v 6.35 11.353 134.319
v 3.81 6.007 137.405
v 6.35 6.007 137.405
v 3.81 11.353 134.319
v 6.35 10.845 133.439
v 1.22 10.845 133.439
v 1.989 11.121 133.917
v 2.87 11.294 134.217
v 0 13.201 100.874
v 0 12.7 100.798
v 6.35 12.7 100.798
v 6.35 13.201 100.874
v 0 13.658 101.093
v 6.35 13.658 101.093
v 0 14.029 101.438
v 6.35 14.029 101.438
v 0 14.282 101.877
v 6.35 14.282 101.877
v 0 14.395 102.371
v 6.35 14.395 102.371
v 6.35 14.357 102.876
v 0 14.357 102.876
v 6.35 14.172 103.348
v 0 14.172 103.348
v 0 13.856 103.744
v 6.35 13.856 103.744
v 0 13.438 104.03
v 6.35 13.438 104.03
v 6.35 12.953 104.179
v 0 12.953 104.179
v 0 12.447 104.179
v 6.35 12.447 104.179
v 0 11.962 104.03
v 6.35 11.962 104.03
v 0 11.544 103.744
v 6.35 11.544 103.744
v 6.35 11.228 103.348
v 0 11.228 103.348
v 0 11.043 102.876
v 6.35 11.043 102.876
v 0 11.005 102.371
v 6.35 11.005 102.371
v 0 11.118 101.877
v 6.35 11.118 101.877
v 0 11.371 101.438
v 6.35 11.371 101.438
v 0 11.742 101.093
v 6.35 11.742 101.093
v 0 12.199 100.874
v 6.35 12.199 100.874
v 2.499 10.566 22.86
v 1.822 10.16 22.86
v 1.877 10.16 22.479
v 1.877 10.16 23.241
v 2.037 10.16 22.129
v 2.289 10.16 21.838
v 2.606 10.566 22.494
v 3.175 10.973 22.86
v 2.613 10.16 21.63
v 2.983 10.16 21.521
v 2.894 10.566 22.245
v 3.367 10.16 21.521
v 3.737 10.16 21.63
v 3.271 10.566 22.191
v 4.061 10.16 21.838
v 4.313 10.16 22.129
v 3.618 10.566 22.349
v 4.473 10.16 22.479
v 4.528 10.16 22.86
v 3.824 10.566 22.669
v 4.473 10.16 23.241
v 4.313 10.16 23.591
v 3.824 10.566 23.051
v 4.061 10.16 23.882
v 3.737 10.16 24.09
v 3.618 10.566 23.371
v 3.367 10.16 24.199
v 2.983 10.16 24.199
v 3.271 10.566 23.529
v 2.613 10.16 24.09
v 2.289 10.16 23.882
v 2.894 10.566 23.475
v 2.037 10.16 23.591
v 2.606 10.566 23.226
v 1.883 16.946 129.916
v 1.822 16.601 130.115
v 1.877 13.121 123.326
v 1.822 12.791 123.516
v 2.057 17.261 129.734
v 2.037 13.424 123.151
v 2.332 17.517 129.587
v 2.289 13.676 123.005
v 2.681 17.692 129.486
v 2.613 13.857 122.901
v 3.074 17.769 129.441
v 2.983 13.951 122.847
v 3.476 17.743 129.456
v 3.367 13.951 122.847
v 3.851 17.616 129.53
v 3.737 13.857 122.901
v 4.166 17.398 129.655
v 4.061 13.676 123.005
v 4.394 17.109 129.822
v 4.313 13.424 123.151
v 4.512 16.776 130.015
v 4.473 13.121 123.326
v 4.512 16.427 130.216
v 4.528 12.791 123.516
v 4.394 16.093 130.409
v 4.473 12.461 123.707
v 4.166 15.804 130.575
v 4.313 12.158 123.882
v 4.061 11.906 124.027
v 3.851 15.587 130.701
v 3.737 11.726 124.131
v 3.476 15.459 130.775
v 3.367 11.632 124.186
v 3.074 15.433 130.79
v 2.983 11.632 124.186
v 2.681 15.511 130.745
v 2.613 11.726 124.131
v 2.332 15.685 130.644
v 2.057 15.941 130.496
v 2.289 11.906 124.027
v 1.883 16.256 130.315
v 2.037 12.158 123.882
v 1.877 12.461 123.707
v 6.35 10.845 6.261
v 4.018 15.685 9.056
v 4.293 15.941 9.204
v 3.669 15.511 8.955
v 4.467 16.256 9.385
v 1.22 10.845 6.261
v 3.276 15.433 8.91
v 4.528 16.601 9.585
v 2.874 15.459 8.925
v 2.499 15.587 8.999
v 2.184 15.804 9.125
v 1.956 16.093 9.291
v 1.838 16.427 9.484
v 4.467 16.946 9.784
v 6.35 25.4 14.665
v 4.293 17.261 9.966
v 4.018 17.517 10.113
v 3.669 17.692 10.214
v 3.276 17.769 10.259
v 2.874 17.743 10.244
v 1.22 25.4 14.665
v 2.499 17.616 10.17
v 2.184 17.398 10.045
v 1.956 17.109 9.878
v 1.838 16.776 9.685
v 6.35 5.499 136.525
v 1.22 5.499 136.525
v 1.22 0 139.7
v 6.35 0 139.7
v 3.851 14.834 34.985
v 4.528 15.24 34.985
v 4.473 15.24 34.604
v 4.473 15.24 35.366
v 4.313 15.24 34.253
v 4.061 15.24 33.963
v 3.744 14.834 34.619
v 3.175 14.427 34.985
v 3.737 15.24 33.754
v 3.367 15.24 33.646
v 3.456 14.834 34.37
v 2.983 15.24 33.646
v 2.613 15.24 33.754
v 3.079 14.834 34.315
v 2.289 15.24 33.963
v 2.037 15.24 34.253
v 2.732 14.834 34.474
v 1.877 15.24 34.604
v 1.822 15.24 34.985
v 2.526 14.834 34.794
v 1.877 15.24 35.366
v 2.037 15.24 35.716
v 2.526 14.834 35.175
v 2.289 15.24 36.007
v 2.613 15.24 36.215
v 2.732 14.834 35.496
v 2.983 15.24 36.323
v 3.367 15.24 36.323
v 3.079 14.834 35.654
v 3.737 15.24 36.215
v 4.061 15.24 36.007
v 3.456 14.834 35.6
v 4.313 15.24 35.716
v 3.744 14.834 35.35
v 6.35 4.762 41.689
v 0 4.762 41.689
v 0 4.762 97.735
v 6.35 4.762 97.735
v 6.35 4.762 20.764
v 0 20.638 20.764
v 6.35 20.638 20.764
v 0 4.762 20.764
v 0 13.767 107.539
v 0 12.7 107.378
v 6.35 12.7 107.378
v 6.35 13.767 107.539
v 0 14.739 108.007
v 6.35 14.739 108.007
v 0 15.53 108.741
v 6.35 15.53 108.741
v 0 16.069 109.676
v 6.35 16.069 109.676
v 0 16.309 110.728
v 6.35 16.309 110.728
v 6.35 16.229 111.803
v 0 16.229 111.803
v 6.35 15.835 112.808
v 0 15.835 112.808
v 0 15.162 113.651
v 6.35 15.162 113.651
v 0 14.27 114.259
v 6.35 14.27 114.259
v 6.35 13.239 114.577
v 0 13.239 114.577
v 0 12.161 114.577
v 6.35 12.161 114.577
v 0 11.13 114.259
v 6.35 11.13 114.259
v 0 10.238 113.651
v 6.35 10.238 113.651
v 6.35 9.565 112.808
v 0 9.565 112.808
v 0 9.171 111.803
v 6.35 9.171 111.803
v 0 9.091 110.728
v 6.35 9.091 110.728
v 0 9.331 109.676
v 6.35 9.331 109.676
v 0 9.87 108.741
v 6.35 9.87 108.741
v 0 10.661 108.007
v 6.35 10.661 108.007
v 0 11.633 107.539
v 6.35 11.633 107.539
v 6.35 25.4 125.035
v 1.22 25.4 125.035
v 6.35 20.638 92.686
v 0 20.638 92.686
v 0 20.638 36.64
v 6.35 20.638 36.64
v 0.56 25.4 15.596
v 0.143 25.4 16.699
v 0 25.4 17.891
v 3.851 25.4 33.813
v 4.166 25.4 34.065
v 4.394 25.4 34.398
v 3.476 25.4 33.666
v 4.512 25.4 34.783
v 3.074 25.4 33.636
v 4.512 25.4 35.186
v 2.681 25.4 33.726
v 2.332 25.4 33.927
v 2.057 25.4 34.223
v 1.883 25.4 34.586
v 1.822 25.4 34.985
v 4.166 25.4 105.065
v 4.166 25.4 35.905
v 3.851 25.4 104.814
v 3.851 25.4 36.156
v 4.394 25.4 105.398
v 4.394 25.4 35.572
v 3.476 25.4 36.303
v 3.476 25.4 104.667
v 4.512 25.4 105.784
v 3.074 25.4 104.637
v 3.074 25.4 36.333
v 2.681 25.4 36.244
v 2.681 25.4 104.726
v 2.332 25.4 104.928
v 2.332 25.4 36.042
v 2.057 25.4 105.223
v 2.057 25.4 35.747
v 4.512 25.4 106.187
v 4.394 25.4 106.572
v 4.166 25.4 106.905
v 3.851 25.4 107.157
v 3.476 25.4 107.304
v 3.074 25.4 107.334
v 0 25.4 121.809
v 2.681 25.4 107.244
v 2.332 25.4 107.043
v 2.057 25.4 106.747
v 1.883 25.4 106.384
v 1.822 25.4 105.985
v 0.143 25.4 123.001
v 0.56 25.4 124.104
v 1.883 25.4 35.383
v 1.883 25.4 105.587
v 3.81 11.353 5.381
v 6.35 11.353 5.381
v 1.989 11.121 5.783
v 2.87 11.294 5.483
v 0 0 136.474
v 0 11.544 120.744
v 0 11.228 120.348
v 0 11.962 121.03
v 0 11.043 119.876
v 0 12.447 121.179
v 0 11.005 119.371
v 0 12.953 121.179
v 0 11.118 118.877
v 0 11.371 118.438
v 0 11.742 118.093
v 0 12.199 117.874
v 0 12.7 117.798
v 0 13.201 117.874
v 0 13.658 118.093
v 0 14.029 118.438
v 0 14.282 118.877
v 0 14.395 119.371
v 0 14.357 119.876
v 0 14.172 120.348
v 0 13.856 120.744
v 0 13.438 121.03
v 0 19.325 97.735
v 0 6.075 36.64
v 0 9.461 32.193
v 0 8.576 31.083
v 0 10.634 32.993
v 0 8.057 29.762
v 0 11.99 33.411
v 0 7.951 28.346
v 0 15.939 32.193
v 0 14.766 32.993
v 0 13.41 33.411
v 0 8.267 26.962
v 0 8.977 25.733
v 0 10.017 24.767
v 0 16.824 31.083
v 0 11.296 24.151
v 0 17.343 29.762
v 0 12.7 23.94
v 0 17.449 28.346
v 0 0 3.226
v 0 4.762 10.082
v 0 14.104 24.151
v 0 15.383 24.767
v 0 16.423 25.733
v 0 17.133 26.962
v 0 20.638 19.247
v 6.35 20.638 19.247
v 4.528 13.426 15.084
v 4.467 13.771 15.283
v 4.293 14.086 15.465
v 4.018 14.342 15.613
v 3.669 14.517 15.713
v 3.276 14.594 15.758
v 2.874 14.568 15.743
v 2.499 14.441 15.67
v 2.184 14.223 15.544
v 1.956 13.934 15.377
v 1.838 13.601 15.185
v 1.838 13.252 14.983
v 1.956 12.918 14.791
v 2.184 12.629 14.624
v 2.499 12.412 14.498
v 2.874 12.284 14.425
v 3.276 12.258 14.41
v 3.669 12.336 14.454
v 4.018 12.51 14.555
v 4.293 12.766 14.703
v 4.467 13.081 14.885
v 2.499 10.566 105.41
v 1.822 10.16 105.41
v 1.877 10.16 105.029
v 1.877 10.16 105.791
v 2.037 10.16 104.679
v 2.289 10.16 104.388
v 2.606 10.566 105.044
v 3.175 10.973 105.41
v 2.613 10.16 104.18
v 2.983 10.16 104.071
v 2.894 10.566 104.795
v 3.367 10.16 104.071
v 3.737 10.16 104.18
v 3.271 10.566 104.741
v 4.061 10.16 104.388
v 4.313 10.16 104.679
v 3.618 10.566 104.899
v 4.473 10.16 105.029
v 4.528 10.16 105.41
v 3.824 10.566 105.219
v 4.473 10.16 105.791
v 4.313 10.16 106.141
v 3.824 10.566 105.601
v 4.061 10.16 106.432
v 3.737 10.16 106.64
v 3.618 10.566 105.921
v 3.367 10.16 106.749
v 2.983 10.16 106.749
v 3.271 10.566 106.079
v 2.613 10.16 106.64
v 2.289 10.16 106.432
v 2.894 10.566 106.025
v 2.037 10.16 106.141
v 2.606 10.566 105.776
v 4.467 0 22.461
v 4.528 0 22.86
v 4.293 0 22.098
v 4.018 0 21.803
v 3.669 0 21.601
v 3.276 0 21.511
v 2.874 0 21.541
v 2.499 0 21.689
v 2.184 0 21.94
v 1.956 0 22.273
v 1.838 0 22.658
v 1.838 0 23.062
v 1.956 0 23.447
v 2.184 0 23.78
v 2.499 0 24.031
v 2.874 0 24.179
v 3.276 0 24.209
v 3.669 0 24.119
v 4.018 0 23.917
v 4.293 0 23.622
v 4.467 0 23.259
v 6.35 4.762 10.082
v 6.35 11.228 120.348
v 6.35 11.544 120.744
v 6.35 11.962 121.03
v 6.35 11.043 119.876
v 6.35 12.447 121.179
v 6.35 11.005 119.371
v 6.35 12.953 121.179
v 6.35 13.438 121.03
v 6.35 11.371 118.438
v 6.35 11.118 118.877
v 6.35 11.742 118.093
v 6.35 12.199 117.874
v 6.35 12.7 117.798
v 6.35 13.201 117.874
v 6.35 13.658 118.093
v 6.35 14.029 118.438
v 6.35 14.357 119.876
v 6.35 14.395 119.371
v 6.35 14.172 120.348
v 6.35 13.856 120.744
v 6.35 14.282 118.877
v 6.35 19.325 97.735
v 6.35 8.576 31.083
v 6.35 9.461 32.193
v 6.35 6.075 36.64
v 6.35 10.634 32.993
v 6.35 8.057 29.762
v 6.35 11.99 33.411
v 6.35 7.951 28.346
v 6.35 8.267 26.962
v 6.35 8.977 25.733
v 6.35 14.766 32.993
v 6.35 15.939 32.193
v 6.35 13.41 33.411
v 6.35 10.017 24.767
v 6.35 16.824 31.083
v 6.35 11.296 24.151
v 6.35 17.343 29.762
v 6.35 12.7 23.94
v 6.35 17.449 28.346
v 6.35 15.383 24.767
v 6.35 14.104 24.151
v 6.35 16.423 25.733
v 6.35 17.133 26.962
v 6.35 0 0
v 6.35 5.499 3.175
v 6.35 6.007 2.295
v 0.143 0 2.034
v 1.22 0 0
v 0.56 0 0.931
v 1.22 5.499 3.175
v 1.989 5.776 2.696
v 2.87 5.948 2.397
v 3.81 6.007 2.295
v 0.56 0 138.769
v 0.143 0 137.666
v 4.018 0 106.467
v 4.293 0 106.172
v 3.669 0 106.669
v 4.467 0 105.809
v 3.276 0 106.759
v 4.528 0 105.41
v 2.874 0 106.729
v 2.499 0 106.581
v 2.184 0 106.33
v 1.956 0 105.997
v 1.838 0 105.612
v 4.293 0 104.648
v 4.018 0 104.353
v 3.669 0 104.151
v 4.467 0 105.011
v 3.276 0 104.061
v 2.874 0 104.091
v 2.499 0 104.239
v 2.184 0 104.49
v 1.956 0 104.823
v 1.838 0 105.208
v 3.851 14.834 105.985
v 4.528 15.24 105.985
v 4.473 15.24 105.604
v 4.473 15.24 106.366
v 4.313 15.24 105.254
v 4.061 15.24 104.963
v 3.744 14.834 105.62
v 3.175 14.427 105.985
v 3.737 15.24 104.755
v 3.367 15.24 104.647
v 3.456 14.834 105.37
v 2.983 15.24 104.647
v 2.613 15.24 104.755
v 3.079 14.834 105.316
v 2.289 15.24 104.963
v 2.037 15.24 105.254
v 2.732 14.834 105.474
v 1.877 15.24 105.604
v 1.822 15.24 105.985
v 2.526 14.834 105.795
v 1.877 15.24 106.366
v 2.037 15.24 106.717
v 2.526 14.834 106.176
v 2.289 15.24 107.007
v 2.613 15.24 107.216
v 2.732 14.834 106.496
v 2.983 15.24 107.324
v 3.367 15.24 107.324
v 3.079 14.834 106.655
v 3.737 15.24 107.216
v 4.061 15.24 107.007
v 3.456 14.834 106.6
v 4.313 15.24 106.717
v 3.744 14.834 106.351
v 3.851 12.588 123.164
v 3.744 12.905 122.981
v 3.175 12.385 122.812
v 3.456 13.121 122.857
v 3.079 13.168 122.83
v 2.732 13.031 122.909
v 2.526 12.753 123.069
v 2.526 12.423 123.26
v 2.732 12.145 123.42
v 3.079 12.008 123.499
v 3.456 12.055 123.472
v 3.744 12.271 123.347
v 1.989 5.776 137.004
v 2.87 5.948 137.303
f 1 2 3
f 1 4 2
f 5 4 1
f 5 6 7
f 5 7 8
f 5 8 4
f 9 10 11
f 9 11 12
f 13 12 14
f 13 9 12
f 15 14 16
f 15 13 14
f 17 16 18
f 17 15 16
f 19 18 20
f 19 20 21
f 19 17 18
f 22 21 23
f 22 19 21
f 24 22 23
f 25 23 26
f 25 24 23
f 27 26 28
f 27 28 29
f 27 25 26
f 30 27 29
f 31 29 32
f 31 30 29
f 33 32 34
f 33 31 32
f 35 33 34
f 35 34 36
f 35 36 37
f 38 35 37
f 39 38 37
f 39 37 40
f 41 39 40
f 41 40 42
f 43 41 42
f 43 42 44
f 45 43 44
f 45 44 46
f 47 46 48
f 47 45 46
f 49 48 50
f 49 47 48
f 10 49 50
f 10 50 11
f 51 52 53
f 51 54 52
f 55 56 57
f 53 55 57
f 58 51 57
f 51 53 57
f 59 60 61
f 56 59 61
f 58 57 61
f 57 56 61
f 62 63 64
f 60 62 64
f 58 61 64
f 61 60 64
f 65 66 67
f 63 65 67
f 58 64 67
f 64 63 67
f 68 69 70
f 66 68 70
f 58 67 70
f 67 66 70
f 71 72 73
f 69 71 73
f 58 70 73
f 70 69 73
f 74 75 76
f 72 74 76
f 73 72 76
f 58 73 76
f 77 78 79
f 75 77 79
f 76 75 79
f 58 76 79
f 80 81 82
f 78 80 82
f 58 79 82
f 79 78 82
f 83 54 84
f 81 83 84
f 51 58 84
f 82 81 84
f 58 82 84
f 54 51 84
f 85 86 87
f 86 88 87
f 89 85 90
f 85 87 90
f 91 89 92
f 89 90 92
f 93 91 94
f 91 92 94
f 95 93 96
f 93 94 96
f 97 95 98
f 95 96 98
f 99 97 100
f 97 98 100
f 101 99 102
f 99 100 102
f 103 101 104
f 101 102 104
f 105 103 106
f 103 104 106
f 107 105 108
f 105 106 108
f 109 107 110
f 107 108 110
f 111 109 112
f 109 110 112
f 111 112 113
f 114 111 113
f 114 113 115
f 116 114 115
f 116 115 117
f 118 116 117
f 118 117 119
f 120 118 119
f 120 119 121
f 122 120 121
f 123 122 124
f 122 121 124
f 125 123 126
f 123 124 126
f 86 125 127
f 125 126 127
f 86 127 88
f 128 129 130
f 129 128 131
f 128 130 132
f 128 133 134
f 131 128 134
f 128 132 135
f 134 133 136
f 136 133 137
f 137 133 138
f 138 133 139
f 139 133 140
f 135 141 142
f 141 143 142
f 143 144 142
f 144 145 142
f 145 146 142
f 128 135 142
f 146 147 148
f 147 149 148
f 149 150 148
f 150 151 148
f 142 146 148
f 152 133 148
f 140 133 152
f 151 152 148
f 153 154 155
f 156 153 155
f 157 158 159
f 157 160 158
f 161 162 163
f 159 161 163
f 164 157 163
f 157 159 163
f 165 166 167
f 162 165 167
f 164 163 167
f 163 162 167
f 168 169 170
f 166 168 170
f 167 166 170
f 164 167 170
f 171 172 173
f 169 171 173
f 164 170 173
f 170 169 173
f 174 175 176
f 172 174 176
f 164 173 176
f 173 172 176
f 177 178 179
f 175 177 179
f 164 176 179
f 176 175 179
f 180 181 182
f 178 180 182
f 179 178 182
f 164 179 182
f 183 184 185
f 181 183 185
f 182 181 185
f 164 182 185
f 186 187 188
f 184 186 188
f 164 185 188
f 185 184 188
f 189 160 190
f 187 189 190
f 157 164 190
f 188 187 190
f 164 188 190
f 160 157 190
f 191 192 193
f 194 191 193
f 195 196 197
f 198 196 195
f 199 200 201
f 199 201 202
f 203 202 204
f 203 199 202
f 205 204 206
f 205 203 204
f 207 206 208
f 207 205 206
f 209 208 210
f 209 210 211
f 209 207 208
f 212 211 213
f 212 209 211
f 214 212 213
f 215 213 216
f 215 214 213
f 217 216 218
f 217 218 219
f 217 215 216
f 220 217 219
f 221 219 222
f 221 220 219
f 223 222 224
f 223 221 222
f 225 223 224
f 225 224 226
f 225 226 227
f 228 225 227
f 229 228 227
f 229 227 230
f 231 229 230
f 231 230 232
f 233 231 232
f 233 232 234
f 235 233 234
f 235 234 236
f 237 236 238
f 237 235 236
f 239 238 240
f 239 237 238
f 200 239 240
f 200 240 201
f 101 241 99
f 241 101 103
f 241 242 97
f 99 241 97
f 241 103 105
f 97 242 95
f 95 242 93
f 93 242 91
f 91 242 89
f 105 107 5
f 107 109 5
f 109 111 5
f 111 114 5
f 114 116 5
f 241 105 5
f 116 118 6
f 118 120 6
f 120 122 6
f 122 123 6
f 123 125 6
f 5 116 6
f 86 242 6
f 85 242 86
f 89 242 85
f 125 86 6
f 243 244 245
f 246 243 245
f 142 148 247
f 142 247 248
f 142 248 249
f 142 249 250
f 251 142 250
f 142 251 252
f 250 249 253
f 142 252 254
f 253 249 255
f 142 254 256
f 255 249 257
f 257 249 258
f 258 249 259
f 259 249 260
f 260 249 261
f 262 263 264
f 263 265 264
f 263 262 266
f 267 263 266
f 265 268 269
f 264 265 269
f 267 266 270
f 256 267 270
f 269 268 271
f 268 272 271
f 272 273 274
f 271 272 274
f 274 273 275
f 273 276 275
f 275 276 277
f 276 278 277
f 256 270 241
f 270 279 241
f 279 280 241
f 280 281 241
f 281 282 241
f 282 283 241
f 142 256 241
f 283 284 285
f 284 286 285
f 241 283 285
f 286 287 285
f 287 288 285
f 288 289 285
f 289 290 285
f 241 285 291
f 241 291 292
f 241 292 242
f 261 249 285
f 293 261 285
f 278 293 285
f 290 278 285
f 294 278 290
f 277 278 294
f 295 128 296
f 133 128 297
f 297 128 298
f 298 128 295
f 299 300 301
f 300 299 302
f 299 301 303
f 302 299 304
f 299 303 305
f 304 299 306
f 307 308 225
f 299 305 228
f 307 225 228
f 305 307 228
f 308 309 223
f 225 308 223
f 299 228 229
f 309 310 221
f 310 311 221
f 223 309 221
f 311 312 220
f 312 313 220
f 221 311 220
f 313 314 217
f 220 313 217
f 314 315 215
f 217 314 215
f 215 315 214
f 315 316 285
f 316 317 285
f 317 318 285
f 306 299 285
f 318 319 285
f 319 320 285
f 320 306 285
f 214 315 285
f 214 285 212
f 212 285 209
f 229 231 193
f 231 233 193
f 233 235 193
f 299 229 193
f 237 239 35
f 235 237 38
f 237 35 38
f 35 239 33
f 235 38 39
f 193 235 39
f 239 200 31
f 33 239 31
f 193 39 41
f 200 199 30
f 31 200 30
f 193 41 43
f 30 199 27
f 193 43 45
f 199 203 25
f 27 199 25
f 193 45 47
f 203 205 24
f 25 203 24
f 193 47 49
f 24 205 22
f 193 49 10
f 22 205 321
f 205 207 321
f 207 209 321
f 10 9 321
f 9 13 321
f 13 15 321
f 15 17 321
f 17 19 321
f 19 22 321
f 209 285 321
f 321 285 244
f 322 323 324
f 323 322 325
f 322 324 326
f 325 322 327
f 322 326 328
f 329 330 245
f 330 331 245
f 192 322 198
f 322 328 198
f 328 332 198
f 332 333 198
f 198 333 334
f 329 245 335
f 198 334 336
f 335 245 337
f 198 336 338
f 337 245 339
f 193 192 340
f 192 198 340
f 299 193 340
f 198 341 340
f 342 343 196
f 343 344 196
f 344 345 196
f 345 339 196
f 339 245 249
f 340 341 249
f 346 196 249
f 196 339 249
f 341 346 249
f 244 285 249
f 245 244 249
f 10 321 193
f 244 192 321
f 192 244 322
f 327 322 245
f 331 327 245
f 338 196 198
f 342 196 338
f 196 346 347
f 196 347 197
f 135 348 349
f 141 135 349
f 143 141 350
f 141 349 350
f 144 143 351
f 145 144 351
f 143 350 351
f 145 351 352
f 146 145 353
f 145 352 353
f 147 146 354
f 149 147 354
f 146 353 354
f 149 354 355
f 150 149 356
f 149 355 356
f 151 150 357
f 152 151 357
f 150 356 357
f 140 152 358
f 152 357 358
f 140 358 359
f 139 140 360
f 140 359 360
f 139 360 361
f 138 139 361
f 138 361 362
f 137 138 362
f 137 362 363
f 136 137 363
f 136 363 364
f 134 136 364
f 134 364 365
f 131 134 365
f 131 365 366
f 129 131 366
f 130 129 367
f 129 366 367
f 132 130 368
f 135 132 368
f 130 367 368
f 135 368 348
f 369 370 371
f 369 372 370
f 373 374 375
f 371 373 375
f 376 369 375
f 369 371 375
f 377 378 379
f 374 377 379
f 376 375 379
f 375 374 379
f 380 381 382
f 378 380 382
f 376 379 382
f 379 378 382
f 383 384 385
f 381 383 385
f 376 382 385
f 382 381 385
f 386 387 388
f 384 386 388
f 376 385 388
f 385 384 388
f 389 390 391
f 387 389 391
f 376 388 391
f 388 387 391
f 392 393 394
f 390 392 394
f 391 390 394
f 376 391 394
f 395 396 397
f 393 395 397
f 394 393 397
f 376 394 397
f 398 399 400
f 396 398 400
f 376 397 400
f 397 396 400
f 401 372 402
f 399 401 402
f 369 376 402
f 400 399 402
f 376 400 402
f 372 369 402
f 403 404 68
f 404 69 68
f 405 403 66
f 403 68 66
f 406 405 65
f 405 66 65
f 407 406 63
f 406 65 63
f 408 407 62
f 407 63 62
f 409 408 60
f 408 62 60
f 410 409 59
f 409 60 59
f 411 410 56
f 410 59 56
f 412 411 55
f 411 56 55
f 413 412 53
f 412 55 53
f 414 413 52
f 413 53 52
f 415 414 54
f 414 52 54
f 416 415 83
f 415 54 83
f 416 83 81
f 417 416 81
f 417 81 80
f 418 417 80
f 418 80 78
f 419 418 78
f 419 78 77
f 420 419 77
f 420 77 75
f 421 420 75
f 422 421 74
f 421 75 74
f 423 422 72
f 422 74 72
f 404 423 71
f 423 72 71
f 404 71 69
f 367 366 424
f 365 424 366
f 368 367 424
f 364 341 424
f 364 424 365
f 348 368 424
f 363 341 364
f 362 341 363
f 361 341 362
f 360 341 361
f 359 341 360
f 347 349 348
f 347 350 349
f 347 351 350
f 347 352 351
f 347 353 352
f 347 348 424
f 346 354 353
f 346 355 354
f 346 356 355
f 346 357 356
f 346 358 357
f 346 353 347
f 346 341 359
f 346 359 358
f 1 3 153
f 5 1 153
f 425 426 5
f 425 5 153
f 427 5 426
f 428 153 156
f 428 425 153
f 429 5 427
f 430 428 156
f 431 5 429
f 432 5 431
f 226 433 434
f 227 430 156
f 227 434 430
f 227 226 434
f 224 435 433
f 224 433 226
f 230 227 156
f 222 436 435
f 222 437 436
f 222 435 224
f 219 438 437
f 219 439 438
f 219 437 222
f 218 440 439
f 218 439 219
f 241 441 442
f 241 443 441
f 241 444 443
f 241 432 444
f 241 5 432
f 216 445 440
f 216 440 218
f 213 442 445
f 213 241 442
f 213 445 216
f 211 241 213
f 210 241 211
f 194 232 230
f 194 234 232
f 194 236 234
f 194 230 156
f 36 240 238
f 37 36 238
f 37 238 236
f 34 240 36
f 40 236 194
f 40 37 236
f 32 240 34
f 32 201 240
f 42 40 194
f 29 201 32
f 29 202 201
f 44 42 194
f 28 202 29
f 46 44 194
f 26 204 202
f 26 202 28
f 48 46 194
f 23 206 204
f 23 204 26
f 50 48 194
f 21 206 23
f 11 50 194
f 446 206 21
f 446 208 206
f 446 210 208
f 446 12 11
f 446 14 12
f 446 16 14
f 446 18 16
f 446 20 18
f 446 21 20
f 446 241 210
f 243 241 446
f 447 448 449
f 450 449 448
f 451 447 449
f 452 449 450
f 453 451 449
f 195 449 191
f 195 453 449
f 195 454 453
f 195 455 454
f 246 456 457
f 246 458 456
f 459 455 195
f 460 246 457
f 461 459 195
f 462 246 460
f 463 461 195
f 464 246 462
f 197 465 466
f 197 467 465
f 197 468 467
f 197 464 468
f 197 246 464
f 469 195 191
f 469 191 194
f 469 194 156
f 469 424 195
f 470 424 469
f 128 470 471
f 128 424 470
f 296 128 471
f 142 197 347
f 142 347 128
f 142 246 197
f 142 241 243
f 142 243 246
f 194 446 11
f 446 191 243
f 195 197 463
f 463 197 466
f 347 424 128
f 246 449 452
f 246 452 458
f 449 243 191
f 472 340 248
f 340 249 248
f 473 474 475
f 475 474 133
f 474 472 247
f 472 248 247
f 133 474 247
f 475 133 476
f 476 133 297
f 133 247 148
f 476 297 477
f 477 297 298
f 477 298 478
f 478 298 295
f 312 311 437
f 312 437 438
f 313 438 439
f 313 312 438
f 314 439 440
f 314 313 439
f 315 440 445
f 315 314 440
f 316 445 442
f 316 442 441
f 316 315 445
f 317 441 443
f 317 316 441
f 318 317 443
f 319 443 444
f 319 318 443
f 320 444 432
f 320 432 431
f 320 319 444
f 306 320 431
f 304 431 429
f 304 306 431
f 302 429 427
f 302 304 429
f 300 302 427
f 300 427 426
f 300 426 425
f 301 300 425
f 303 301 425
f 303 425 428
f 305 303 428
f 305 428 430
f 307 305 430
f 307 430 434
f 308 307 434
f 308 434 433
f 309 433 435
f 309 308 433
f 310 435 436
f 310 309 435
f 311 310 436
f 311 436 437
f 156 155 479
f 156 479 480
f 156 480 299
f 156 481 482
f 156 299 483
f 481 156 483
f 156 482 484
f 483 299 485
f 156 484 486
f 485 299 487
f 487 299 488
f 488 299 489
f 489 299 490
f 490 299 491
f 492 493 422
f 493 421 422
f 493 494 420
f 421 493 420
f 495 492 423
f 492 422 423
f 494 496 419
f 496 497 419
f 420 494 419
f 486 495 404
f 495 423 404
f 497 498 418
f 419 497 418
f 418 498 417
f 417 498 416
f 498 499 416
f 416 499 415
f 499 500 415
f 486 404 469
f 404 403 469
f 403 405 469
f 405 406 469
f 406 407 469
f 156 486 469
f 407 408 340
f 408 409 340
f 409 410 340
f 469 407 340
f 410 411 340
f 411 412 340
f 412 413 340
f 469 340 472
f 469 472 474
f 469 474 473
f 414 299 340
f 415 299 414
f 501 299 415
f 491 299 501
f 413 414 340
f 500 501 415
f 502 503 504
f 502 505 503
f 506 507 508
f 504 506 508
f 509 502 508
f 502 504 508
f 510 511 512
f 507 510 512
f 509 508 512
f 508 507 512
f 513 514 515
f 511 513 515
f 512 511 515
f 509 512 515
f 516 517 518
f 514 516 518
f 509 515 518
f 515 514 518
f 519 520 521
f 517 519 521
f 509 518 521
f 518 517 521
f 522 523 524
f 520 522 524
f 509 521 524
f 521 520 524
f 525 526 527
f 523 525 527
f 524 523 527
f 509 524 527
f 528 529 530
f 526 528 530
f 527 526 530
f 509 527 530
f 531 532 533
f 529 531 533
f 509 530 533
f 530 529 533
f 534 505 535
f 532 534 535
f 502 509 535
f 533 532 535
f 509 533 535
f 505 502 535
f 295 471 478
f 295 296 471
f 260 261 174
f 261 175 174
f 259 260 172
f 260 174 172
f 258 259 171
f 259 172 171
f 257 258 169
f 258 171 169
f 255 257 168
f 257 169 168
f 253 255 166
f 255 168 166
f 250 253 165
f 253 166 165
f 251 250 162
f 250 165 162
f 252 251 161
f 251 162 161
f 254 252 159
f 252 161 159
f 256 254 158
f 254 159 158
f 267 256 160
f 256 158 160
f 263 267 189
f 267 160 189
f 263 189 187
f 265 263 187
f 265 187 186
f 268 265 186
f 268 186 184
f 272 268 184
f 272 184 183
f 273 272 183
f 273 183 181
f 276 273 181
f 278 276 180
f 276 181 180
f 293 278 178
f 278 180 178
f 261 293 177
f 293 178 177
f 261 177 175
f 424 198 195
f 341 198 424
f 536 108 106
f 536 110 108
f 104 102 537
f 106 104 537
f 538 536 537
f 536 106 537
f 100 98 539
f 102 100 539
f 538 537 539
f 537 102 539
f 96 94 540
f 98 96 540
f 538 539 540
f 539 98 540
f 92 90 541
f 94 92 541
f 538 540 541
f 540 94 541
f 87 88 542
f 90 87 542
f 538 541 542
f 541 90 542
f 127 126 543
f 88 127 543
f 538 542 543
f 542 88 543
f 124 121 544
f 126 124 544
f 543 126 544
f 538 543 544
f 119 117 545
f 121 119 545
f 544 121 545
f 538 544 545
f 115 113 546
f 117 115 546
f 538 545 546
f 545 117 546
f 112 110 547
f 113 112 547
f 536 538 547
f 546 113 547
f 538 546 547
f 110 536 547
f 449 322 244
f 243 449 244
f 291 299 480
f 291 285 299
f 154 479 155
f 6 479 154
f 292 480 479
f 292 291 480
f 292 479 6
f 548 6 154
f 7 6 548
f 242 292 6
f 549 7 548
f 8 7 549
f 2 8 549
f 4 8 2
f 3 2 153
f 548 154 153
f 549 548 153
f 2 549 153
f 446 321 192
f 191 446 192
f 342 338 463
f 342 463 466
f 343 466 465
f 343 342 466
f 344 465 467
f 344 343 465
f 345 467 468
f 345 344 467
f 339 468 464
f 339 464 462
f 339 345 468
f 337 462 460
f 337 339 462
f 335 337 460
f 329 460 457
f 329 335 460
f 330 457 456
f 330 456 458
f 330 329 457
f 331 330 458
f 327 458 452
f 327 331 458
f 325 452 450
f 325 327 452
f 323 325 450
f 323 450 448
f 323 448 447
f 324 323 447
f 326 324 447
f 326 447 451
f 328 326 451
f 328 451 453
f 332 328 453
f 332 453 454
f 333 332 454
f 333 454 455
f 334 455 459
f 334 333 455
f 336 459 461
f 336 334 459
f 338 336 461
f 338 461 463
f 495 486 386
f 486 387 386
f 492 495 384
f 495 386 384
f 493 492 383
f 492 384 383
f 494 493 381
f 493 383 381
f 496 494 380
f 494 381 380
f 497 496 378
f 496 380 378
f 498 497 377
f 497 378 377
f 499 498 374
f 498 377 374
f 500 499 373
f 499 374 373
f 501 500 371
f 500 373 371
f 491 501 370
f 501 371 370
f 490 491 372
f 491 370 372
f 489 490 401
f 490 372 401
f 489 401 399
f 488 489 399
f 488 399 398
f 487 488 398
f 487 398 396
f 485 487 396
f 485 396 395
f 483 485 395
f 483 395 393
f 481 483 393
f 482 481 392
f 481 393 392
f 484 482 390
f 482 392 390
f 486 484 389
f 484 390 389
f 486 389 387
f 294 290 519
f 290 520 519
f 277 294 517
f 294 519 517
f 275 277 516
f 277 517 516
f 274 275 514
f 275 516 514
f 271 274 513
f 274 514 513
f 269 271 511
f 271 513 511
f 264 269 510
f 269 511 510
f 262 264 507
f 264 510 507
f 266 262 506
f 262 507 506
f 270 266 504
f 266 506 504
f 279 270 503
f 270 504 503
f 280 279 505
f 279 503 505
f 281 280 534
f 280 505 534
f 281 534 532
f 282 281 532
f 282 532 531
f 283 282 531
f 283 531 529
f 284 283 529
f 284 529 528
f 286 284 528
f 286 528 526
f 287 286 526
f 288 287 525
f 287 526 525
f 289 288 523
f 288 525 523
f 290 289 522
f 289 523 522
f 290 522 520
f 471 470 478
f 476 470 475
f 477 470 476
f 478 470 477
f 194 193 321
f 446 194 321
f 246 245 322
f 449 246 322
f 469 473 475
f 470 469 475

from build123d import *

# Parameters (mm, degrees)
SKETCH1_R                     = 3.6195
SKETCH1_R_2                   = 4.7625
SKETCH1_R_3                   = 1.6999966
BOSS_EXTRUDE1_DEPTH           = 6.35
TAP_DRILL_FOR_6_32_TAP4_D     = 2.7051
TAP_DRILL_FOR_6_32_TAP4_DEPTH = 10.16
TAP_DRILL_FOR_6_32_TAP4_TIP   = 0.81269403
TAP_DRILL_FOR_6_32_TAP3_D     = 2.7051
TAP_DRILL_FOR_6_32_TAP3_DEPTH = 10.16
TAP_DRILL_FOR_6_32_TAP3_TIP   = 0.81269403
SKETCH11_W                    = 6.35
SKETCH11_H                    = 6.1722
BOSS_EXTRUDE2_DEPTH           = 1.016
SKETCH12_W                    = 6.35
SKETCH12_H                    = 6.1722
BOSS_EXTRUDE3_DEPTH           = 1.016
TAP_DRILL_FOR_6_32_TAP1_D     = 2.7051
TAP_DRILL_FOR_6_32_TAP1_DEPTH = 7.62
TAP_DRILL_FOR_6_32_TAP1_TIP   = 0.81269403
TAP_DRILL_FOR_6_32_TAP2_D     = 2.7051
TAP_DRILL_FOR_6_32_TAP2_DEPTH = 7.62
TAP_DRILL_FOR_6_32_TAP2_TIP   = 0.81269403
CUT_EXTRUDE1_DEPTH            = 143.132235964
FILLET1_R                     = 3.81


with BuildPart() as part:
    # Sketch1 → Boss-Extrude1 (new body)
    with BuildSketch(Plane(origin=(0, 0, 0), x_dir=(0, 0, -1), z_dir=(1, 0, 0))):
        Polygon((0, 0), (-14.664696837, 25.4), (-125.035303163, 25.4), (-139.7, 0), align=None)
        with Locations((-110.998, 12.7)):
            Circle(SKETCH1_R, mode=Mode.SUBTRACT)
        with Locations((-28.702, 12.7)):
            Circle(SKETCH1_R_2, mode=Mode.SUBTRACT)
        with Locations((-102.4979916, 12.7)):
            Circle(SKETCH1_R_3, mode=Mode.SUBTRACT)
        with Locations((-119.4980084, 12.7)):
            Circle(SKETCH1_R_3, mode=Mode.SUBTRACT)
    extrude(amount=BOSS_EXTRUDE1_DEPTH)

    # Tap Drill for #6-32 Tap4
    with Locations(Plane(origin=(0, 25.4, 0), x_dir=(1, 0, 0), z_dir=(0, 1, 0))):
        with Locations((3.175, -105.985303163), (3.175, -34.984696837)):
            Hole(TAP_DRILL_FOR_6_32_TAP4_D / 2, depth=TAP_DRILL_FOR_6_32_TAP4_DEPTH)
            with Locations((0, 0, -(TAP_DRILL_FOR_6_32_TAP4_DEPTH + TAP_DRILL_FOR_6_32_TAP4_TIP / 2))):  # 118° drill point
                Cone(0, TAP_DRILL_FOR_6_32_TAP4_D / 2, TAP_DRILL_FOR_6_32_TAP4_TIP, mode=Mode.SUBTRACT)

    # Tap Drill for #6-32 Tap3
    with Locations(Plane(origin=(0, 0, 0), x_dir=(-1, 0, 0), z_dir=(0, -1, 0))):
        with Locations((-3.175, -105.41), (-3.175, -22.86)):
            Hole(TAP_DRILL_FOR_6_32_TAP3_D / 2, depth=TAP_DRILL_FOR_6_32_TAP3_DEPTH)
            with Locations((0, 0, -(TAP_DRILL_FOR_6_32_TAP3_DEPTH + TAP_DRILL_FOR_6_32_TAP3_TIP / 2))):  # 118° drill point
                Cone(0, TAP_DRILL_FOR_6_32_TAP3_D / 2, TAP_DRILL_FOR_6_32_TAP3_TIP, mode=Mode.SUBTRACT)

    # Sketch11 → Boss-Extrude2 (add)
    with BuildSketch(Plane(origin=(0, 60.491874454, 104.775), x_dir=(1, 0, 0), z_dir=(0, 0.5000000000000037, 0.8660254037844365))):
        with Locations((3.175, -60.4139)):
            Rectangle(SKETCH11_W, SKETCH11_H)
    extrude(amount=BOSS_EXTRUDE2_DEPTH)

    # Sketch12 → Boss-Extrude3 (add)
    with BuildSketch(Plane(origin=(0, 0, 0), x_dir=(-1, 0, 0), z_dir=(0, 0.49999999999999806, -0.8660254037844398))):
        with Locations((-3.175, 9.4361)):
            Rectangle(SKETCH12_W, SKETCH12_H)
    extrude(amount=BOSS_EXTRUDE3_DEPTH)

    # Tap Drill for #6-32 Tap1
    with Locations(Plane(origin=(0, 60.491874454, 104.775), x_dir=(1, 0, 0), z_dir=(0, 0.5000000000000037, 0.8660254037844365))):
        with Locations((3.175, -50.680606325)):
            Hole(TAP_DRILL_FOR_6_32_TAP1_D / 2, depth=TAP_DRILL_FOR_6_32_TAP1_DEPTH)
            with Locations((0, 0, -(TAP_DRILL_FOR_6_32_TAP1_DEPTH + TAP_DRILL_FOR_6_32_TAP1_TIP / 2))):  # 118° drill point
                Cone(0, TAP_DRILL_FOR_6_32_TAP1_D / 2, TAP_DRILL_FOR_6_32_TAP1_TIP, mode=Mode.SUBTRACT)

    # Tap Drill for #6-32 Tap2
    with Locations(Plane(origin=(0, 0, 0), x_dir=(-1, 0, 0), z_dir=(0, 0.49999999999999806, -0.8660254037844398))):
        with Locations((-3.175, 19.169393675)):
            Hole(TAP_DRILL_FOR_6_32_TAP2_D / 2, depth=TAP_DRILL_FOR_6_32_TAP2_DEPTH)
            with Locations((0, 0, -(TAP_DRILL_FOR_6_32_TAP2_DEPTH + TAP_DRILL_FOR_6_32_TAP2_TIP / 2))):  # 118° drill point
                Cone(0, TAP_DRILL_FOR_6_32_TAP2_D / 2, TAP_DRILL_FOR_6_32_TAP2_TIP, mode=Mode.SUBTRACT)

    # Sketch19 → Cut-Extrude1 (cut, through all)
    with BuildSketch(Plane.ZY):
        Polygon((92.68551049, 20.6375), (36.6395, 20.6375), (36.6395, 6.07467201), align=None)
        Polygon((97.7354916, 4.7625), (97.7354916, 19.32532799), (41.68948111, 4.7625), align=None)
        Polygon((20.7645, 20.6375), (20.7645, 4.7625), (10.081979076, 4.7625), (19.247414599, 20.6375), align=None)
    extrude(amount=-CUT_EXTRUDE1_DEPTH, mode=Mode.SUBTRACT)

    # Fillet1
    fillet1_edges = [part.edges().sort_by_distance(p)[0] for p in [
        (0, 8.679902313, 135.86183181),
        (0, 8.679902313, 3.83816819),
    ]]
    fillet(fillet1_edges, radius=FILLET1_R)


solid = part.part
